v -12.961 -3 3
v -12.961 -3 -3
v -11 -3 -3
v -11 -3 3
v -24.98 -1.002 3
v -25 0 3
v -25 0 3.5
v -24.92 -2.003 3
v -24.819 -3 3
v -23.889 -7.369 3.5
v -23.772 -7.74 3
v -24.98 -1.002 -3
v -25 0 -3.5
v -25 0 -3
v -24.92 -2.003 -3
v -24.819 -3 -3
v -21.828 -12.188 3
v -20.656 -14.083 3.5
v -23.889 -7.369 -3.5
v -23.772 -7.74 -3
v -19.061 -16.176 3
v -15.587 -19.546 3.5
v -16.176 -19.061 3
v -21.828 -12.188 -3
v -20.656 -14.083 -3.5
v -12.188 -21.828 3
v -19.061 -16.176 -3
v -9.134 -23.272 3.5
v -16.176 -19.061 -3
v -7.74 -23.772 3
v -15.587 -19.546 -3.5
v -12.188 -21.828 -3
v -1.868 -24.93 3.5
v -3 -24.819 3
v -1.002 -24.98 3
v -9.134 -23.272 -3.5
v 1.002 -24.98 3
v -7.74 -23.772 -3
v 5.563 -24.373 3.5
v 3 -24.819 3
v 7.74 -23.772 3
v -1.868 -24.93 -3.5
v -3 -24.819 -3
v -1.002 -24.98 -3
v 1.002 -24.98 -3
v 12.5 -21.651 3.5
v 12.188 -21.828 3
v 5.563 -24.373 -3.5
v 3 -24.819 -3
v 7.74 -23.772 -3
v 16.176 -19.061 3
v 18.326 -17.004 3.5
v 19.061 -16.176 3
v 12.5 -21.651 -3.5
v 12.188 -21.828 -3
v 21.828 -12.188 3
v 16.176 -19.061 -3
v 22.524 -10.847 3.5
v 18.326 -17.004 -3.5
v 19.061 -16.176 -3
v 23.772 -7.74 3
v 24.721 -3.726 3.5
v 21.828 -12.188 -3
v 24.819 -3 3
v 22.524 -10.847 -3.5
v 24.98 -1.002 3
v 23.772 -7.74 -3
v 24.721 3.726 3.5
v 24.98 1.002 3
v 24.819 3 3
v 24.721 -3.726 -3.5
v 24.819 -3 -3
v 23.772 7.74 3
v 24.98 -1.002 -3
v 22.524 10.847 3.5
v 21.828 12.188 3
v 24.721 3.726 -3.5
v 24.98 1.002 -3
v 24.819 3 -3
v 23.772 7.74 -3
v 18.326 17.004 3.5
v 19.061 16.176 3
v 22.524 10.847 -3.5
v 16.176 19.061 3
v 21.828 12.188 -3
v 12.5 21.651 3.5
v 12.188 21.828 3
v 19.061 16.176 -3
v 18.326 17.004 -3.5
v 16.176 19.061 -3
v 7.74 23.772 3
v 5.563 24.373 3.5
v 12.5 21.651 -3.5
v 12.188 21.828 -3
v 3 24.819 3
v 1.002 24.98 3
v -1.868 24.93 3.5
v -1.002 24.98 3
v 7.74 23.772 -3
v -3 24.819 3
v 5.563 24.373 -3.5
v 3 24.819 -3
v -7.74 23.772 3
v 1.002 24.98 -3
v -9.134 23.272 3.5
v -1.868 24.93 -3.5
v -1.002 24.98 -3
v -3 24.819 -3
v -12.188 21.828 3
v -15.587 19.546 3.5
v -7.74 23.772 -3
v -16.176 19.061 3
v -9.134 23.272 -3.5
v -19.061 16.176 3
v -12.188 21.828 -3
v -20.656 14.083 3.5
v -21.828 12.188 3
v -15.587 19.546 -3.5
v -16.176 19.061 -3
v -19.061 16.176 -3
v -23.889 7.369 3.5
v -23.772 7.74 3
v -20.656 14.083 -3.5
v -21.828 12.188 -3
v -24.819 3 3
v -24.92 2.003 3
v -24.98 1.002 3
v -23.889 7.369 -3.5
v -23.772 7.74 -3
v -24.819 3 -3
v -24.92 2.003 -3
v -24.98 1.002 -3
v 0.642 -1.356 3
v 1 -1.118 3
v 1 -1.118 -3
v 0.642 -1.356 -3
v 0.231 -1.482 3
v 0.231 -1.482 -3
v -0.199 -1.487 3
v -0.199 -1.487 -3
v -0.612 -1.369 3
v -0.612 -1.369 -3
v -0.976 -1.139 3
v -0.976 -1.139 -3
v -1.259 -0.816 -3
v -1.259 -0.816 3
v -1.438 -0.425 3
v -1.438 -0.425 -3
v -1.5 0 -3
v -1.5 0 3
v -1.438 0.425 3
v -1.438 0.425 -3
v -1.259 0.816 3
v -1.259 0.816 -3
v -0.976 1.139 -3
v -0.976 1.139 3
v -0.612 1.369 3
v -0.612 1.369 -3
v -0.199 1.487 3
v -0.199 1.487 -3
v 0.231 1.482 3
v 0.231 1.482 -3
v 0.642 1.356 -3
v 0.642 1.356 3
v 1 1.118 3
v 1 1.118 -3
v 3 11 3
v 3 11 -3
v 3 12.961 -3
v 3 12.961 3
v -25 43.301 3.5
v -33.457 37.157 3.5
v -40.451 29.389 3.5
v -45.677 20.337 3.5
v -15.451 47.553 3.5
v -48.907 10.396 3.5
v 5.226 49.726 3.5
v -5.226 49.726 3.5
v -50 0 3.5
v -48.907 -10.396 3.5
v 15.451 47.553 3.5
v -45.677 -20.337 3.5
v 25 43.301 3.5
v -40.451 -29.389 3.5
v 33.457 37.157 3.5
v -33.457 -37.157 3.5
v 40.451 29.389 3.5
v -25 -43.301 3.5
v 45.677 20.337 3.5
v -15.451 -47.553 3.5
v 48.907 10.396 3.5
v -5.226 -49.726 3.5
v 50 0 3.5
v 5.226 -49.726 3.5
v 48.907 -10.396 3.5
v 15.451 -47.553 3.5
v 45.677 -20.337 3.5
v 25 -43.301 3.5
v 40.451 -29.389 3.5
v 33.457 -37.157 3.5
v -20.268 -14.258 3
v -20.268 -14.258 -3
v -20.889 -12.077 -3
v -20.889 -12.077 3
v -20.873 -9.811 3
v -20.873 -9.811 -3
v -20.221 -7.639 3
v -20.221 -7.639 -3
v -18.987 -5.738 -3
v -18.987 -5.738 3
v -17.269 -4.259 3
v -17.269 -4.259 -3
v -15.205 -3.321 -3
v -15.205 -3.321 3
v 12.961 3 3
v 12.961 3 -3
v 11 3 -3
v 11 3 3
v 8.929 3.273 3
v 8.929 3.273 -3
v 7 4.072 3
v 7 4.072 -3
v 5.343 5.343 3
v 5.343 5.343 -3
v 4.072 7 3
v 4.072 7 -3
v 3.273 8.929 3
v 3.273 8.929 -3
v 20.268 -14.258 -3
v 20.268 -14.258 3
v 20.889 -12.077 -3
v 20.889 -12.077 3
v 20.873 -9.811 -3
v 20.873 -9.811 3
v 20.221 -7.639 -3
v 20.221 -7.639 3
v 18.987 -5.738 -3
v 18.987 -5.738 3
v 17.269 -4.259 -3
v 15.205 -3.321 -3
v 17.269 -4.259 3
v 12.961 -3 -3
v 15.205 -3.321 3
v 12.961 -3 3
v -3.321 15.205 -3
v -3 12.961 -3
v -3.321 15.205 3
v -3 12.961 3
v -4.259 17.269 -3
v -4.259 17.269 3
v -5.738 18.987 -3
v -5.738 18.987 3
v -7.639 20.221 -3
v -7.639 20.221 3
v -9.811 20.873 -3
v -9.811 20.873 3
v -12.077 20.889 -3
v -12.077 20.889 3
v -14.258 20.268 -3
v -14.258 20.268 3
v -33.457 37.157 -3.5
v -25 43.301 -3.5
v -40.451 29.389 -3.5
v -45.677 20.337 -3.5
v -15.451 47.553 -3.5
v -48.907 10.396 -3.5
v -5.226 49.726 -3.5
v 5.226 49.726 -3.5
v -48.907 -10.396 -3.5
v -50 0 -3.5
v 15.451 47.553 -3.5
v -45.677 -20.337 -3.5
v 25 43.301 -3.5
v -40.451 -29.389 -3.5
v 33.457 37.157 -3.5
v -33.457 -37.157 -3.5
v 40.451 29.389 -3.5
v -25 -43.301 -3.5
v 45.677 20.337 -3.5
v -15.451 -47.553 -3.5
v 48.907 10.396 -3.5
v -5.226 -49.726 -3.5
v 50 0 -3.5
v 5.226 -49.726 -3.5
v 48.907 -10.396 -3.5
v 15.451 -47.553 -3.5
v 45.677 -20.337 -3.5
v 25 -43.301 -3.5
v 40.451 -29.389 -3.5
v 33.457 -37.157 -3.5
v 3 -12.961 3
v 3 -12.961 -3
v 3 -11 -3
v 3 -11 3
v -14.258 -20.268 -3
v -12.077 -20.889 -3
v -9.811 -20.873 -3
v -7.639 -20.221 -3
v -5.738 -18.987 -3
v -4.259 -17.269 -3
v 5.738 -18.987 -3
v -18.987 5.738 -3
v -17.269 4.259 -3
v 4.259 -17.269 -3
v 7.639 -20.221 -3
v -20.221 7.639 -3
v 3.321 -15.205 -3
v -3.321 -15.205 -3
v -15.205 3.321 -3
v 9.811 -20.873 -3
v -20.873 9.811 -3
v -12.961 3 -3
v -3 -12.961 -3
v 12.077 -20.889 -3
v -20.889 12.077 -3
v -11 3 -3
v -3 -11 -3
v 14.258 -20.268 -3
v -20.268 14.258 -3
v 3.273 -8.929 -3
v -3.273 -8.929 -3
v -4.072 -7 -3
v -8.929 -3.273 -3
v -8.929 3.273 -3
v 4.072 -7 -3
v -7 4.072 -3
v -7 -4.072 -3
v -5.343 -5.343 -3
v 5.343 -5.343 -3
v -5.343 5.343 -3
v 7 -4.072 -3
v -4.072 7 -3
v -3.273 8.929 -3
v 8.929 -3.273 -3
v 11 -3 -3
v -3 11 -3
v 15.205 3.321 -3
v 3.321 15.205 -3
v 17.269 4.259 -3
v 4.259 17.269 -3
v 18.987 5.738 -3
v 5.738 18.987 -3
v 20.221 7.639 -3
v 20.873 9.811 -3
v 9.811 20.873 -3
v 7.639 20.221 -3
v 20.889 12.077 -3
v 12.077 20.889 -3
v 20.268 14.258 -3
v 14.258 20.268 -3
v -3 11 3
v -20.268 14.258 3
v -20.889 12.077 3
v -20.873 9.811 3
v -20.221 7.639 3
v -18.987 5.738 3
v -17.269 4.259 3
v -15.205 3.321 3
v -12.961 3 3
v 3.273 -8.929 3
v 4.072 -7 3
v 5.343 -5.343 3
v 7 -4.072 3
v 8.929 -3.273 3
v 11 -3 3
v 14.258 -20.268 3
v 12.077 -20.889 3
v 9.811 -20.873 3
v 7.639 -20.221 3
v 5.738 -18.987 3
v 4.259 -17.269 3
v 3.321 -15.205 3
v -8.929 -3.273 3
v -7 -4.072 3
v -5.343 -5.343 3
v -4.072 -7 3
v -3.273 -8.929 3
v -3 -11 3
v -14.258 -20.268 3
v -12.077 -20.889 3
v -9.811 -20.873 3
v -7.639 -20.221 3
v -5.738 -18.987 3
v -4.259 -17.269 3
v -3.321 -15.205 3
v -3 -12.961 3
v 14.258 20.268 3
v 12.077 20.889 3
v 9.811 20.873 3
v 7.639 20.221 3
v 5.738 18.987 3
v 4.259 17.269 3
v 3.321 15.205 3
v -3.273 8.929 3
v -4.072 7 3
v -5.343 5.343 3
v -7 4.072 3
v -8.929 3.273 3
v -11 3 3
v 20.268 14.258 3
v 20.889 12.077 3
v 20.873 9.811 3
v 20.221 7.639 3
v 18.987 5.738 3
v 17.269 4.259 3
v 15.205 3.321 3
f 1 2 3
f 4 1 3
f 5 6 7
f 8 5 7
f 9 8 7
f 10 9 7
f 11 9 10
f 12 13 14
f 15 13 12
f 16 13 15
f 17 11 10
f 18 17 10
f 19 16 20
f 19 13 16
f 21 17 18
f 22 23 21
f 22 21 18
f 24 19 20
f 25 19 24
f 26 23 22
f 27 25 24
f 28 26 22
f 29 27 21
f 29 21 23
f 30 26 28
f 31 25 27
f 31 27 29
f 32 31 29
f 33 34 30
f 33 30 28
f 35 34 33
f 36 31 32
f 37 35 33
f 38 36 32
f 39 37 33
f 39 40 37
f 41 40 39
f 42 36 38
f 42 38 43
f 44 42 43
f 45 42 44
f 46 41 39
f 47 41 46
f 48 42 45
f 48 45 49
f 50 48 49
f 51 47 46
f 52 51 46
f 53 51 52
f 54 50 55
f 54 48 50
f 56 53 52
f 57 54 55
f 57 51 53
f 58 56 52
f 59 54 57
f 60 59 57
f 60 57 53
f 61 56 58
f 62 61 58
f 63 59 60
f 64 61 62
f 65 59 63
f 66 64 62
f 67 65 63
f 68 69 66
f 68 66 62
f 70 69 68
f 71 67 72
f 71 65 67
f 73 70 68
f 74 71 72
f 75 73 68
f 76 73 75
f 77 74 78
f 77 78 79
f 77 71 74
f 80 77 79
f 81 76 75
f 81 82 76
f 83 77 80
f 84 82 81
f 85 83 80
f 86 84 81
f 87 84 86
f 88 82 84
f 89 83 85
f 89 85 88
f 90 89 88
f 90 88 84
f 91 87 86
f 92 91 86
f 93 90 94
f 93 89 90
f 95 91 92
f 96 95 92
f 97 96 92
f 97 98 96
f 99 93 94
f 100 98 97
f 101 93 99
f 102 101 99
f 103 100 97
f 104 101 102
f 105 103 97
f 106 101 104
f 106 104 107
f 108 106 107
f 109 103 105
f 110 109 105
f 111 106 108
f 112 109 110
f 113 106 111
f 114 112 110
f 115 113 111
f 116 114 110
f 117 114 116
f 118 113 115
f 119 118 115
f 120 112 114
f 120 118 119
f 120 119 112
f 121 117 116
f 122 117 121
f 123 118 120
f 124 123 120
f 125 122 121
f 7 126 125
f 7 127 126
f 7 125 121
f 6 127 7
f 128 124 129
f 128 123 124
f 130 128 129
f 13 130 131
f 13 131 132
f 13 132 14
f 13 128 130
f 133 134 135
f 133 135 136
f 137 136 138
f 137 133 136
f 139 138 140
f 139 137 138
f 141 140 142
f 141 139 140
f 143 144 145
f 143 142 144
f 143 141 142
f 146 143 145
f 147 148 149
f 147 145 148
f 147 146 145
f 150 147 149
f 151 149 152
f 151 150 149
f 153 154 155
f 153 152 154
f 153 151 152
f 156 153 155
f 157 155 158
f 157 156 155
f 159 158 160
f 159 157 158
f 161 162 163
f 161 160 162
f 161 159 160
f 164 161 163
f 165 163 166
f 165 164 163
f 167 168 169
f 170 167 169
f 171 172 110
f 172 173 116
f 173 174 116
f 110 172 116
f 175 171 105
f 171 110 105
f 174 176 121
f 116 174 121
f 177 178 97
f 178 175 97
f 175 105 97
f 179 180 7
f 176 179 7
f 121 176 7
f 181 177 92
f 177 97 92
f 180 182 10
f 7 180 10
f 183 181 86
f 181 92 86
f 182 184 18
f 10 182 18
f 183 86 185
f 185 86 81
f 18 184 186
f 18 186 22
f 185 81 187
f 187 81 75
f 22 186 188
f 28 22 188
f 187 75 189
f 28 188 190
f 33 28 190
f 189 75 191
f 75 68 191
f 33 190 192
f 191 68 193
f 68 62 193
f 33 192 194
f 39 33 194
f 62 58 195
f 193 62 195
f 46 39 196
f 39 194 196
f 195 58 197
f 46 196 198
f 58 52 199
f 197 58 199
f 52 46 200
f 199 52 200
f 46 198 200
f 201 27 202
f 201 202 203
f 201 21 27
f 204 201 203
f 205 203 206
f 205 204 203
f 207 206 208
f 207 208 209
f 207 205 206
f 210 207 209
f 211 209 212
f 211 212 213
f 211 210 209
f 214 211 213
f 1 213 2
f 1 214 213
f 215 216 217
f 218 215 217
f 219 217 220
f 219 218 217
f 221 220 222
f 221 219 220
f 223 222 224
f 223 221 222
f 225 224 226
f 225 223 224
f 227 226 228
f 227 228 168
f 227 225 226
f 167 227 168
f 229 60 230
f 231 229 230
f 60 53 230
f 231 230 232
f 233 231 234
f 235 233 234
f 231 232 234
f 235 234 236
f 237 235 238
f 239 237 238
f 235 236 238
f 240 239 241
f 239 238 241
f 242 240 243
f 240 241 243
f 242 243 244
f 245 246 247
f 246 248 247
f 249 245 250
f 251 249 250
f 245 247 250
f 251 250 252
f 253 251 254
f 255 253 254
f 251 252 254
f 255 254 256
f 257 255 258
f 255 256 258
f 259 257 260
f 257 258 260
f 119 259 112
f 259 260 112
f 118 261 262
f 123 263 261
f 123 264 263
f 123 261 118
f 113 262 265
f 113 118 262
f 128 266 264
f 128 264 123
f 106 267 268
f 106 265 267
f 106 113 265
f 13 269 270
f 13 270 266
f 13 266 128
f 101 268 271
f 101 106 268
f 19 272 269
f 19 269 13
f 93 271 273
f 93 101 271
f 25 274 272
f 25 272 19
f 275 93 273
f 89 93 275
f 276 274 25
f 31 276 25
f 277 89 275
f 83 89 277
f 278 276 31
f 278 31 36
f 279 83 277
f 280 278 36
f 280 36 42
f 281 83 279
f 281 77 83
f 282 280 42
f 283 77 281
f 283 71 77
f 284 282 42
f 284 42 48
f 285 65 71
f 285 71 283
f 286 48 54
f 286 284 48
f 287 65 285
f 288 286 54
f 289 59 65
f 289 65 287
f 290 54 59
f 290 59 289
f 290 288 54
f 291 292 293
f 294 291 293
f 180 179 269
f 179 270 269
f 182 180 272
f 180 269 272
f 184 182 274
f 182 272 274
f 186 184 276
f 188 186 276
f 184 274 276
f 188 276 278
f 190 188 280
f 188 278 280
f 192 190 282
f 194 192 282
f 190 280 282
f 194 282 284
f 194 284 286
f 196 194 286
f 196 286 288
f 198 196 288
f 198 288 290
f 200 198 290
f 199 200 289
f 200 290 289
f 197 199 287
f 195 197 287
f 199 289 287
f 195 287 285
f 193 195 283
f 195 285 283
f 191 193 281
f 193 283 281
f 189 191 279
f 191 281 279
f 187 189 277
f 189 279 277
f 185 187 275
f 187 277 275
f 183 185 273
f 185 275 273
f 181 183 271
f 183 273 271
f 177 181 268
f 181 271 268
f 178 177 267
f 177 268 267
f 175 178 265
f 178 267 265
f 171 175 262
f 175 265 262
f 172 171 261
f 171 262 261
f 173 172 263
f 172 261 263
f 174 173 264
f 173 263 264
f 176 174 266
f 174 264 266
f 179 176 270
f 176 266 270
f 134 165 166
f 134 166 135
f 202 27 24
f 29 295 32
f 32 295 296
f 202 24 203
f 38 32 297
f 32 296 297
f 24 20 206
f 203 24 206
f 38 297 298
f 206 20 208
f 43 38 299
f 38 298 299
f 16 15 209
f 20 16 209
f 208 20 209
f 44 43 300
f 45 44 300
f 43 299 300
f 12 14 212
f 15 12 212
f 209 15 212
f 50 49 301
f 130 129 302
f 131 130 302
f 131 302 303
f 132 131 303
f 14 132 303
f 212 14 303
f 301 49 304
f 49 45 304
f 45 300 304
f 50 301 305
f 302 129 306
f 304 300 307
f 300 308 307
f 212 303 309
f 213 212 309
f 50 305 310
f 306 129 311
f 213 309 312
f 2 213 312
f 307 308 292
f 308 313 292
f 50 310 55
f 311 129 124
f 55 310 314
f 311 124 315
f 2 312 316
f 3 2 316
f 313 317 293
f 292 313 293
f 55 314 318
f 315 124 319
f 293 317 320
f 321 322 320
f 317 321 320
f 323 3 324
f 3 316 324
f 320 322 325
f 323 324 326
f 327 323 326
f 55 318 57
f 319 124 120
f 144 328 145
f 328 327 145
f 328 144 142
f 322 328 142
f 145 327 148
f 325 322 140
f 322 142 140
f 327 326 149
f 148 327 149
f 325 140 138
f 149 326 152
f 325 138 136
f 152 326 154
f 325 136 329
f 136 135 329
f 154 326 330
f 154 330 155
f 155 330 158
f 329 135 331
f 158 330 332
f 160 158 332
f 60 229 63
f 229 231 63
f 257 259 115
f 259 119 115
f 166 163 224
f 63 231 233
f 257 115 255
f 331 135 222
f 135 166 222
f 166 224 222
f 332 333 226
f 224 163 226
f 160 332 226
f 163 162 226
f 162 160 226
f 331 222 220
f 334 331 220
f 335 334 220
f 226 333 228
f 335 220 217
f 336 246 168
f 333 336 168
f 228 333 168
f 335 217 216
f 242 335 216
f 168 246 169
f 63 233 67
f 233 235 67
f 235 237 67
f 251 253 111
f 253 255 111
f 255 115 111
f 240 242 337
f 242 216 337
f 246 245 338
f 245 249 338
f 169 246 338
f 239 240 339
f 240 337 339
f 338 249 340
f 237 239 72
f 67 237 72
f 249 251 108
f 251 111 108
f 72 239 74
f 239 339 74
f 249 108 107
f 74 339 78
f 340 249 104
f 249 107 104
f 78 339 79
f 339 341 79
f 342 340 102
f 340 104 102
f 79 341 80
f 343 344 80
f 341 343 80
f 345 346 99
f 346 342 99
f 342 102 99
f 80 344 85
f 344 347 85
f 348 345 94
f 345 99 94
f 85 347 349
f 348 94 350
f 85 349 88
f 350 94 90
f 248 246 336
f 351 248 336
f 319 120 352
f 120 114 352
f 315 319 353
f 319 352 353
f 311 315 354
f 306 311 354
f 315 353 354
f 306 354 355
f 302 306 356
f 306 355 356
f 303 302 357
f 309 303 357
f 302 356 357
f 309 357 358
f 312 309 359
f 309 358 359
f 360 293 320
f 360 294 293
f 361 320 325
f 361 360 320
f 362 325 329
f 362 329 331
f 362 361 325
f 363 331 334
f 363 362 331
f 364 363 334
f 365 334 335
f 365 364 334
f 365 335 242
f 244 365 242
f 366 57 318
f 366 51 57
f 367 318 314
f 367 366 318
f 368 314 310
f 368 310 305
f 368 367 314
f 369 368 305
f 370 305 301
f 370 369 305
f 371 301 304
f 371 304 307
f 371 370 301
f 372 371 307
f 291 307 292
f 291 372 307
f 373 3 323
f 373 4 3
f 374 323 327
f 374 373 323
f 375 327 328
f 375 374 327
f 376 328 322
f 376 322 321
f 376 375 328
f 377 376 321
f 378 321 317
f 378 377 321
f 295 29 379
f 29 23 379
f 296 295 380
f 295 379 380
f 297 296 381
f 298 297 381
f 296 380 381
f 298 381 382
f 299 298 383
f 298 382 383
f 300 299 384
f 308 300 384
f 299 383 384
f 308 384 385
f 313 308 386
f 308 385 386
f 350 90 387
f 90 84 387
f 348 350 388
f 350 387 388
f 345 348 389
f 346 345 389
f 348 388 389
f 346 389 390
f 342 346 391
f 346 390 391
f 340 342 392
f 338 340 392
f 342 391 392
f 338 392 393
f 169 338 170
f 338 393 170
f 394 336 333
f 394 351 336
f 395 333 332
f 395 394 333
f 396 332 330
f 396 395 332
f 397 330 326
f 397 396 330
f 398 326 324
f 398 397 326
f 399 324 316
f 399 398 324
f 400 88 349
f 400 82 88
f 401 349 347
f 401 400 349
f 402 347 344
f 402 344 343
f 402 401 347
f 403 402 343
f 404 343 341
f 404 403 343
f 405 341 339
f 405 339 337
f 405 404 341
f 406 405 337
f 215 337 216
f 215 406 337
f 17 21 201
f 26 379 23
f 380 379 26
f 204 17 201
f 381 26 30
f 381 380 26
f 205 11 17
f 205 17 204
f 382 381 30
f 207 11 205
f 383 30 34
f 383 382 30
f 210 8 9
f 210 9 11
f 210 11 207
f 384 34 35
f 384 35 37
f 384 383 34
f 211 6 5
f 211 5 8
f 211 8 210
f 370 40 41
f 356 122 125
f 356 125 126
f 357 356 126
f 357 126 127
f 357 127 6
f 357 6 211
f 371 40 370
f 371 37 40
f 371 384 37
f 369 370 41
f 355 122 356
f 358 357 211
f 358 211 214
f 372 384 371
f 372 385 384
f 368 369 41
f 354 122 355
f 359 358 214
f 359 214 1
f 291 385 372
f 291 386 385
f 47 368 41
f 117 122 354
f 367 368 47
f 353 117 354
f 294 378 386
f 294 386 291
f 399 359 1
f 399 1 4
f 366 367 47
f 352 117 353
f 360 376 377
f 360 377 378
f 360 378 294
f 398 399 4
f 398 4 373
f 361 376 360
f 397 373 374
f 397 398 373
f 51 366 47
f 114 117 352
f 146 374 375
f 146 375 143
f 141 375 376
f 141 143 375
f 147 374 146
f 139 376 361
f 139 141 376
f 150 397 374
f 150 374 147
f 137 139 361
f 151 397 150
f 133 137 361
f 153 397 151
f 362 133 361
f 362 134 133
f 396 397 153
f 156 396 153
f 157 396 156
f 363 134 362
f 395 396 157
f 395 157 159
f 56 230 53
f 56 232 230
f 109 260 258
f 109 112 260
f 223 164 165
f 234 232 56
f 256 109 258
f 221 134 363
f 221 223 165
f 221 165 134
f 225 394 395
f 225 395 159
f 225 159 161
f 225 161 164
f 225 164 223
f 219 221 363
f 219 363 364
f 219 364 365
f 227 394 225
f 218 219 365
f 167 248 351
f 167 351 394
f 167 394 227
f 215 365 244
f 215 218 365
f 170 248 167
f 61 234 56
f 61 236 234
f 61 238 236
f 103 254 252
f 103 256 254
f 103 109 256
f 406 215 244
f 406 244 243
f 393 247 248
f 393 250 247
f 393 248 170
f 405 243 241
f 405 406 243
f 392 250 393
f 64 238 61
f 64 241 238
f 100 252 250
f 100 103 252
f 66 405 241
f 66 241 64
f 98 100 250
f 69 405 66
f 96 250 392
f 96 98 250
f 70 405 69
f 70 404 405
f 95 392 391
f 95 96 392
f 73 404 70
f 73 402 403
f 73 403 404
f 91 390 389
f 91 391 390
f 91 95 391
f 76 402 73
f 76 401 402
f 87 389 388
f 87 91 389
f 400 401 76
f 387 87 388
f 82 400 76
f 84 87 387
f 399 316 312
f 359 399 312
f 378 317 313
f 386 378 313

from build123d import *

# Parameters (mm, degrees)
SKETCH4_W                = 25
SKETCH4_H                = 7
BOSS_EXTRUDE3_DEPTH      = 3
BOSS_EXTRUDE3_DEPTH_BACK = 3
FILLET2_R                = 8
CUT_EXTRUDE1_REACH       = 73.009


with BuildPart() as part:
    # Sketch4 → Revolve2 (revolve)
    with BuildSketch(Plane(origin=(0, 0, 0), x_dir=(1, 0, 0), z_dir=(0, 1, 0)), mode=Mode.PRIVATE) as revolve2_sk:
        with Locations((37.5, 0)):
            Rectangle(SKETCH4_W, SKETCH4_H)
    revolve(revolve2_sk.sketch.rotate(Axis((0, 0, -11.674254949), (0, 0, 1)), 180), axis=Axis((0, 0, -11.674254949), (0, 0, 1)))

    # Sketch5 → Boss-Extrude3 (add, two sides: drawn at the far end of the back side and taken through both)
    with BuildSketch(Plane.XY.offset(-BOSS_EXTRUDE3_DEPTH_BACK)):
        with BuildLine():
            Line((-3, 24.819347292), (-3, 3))
            Line((-3, 3), (-24.819347292, 3))
            ThreePointArc((-24.819347292, 3), (-25, 0), (-24.819347292, -3))
            Line((-24.819347292, -3), (-3, -3))
            Line((-3, -3), (-3, -24.819347292))
            ThreePointArc((-3, -24.819347292), (0, -25), (3, -24.819347292))
            Line((3, -24.819347292), (3, -3))
            Line((3, -3), (24.819347292, -3))
            ThreePointArc((24.819347292, -3), (25, 0), (24.819347292, 3))
            Line((24.819347292, 3), (3, 3))
            Line((3, 3), (3, 24.819347292))
            ThreePointArc((3, 24.819347292), (0, 25), (-3, 24.819347292))
        make_face()
    extrude(amount=BOSS_EXTRUDE3_DEPTH + BOSS_EXTRUDE3_DEPTH_BACK)

    # Fillet2
    fillet2_edges = [part.edges().sort_by_distance(p)[0] for p in [
        (-3, 24.819347292, 0),
        (3, 24.819347292, 0),
        (3, 3, 0),
        (24.819347292, 3, 0),
        (24.819347292, -3, 0),
        (3, -3, 0),
        (3, -24.819347292, 0),
        (-3, -24.819347292, 0),
        (-3, -3, 0),
        (-24.819347292, -3, 0),
        (-24.819347292, 3, 0),
        (-3, 3, 0),
    ]]
    fillet(fillet2_edges, radius=FILLET2_R)

    # Sketch6 → Cut-Extrude1 (cut, up to next)
    with BuildSketch(Plane.XY.offset(3), mode=Mode.PRIVATE) as cut_extrude1_sk1:
        with BuildLine():
            Line((1, 1.118033989), (1, -1.118033989))
            ThreePointArc((1, -1.118033989), (-1.5, 0), (1, 1.118033989))
        make_face()
    cut_extrude1_tool1 = extrude(cut_extrude1_sk1.sketch, amount=-CUT_EXTRUDE1_REACH, mode=Mode.PRIVATE) & part.part
    add(cut_extrude1_tool1.solids().sort_by_distance((-0.148024, 0, 3))[0], mode=Mode.SUBTRACT)


solid = part.part
